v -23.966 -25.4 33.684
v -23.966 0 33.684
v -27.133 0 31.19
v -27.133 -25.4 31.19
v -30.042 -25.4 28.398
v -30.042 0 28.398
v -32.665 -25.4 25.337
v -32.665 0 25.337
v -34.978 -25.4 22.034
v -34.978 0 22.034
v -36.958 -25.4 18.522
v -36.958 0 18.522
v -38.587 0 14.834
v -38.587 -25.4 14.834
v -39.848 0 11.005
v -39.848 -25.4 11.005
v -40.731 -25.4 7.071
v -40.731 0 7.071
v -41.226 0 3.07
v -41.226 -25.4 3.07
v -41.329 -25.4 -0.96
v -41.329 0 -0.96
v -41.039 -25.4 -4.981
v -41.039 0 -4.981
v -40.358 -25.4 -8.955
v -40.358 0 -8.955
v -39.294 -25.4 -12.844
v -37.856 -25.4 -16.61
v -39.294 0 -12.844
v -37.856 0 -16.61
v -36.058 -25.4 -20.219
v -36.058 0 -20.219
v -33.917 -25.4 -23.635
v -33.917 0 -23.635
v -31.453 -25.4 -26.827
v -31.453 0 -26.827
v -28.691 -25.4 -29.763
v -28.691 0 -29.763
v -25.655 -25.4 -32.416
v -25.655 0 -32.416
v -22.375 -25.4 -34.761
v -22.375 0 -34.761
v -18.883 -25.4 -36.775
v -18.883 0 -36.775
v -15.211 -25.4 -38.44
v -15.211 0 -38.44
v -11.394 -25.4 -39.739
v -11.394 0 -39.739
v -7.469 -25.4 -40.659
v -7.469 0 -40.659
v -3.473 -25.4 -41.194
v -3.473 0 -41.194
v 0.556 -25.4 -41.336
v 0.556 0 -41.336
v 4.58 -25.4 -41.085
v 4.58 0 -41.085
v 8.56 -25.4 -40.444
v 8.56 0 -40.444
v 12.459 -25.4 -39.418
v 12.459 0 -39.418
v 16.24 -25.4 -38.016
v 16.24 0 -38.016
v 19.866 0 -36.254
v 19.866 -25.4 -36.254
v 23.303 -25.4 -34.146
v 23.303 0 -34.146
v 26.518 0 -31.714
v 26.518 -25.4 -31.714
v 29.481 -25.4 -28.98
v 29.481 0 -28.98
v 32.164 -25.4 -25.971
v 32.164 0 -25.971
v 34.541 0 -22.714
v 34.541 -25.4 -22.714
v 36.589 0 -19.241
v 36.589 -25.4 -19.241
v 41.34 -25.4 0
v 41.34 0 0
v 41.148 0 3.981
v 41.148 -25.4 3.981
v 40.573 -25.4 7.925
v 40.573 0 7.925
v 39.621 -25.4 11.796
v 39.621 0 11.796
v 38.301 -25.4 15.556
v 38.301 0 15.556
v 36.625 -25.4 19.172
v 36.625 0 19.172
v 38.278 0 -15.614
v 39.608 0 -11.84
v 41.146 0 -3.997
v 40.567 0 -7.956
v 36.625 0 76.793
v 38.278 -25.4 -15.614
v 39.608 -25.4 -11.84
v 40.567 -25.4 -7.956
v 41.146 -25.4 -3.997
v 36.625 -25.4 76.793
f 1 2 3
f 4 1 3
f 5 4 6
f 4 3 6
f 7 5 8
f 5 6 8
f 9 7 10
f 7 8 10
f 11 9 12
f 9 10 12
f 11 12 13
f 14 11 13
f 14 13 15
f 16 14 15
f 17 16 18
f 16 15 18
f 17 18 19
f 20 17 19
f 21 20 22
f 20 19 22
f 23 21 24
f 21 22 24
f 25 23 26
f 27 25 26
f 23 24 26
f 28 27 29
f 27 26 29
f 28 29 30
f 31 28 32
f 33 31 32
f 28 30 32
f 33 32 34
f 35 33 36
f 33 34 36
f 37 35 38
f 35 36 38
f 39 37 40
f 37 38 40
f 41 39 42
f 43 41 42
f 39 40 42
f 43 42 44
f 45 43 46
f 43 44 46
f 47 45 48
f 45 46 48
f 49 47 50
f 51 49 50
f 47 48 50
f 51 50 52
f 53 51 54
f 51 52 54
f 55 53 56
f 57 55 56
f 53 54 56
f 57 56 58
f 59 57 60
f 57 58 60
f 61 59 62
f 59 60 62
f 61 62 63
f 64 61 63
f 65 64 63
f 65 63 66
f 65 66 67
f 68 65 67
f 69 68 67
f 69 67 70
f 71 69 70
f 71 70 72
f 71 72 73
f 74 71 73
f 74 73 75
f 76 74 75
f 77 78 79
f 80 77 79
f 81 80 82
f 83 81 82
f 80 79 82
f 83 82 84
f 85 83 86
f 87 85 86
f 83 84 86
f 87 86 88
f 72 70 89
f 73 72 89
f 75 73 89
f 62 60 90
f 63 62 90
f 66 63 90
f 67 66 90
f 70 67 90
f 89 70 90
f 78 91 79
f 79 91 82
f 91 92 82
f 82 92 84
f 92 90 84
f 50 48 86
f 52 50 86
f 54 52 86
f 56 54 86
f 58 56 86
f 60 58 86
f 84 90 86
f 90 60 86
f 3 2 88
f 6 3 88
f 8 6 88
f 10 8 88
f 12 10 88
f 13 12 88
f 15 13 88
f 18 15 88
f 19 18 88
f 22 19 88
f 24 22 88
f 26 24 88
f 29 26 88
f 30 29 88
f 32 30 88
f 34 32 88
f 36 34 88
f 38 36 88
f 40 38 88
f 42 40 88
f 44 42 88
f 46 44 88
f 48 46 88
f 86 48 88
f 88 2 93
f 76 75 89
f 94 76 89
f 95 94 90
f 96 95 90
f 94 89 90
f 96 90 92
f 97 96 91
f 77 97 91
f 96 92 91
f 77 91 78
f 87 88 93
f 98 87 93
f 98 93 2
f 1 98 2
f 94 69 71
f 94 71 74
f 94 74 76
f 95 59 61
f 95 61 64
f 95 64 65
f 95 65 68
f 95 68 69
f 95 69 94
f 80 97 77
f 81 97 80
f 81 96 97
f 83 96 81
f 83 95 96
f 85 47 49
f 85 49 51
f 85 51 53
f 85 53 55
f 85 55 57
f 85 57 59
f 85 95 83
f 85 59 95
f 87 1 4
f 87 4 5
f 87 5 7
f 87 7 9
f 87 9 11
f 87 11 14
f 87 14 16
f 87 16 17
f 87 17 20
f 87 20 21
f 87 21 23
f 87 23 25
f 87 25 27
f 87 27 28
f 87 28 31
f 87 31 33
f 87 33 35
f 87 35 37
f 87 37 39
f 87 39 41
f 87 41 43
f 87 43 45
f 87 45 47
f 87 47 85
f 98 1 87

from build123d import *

# Parameters (mm, degrees)
F2_DEPTH = 25.4
F3_DEPTH = 25.4


with BuildPart() as f2:
    # F0 (on Front) → F2 (new body)
    with BuildSketch(Plane.XZ):
        with BuildLine():
            ThreePointArc((36.588859, -19.241439), (26.227151, -0.024717), (36.62506, 19.172441))
            ThreePointArc((36.62506, 19.172441), (9.628766, 40.202791), (-23.965633, 33.68421))
            ThreePointArc((-23.965633, 33.68421), (-27.205101, -31.126516), (36.588859, -19.241439))
        make_face()
    extrude(amount=F2_DEPTH)

    # F0 (on Front) → F3 (join)
    with BuildSketch(Plane.XZ):
        with BuildLine():
            ThreePointArc((36.588859, -19.241439), (40.13448, -9.909645), (41.339782, 0))
            ThreePointArc((41.339782, 0), (40.143801, 9.871817), (36.62506, 19.172441))
            ThreePointArc((36.62506, 19.172441), (26.227151, -0.024717), (36.588859, -19.241439))
        make_face()
        with BuildLine():
            ThreePointArc((36.588859, -19.241439), (26.227151, -0.024717), (36.62506, 19.172441))
            ThreePointArc((36.62506, 19.172441), (9.628766, 40.202791), (-23.965633, 33.68421))
            ThreePointArc((-23.965633, 33.68421), (-27.205101, -31.126516), (36.588859, -19.241439))
        make_face()
        with BuildLine():
            ThreePointArc((-23.965633, 33.68421), (9.628766, 40.202791), (36.62506, 19.172441))
            Line((36.62506, 19.172441), (36.62506, 76.793261))
            Line((36.62506, 76.793261), (-23.965633, 33.68421))
        make_face()
    extrude(amount=F3_DEPTH)


solid = f2.part
